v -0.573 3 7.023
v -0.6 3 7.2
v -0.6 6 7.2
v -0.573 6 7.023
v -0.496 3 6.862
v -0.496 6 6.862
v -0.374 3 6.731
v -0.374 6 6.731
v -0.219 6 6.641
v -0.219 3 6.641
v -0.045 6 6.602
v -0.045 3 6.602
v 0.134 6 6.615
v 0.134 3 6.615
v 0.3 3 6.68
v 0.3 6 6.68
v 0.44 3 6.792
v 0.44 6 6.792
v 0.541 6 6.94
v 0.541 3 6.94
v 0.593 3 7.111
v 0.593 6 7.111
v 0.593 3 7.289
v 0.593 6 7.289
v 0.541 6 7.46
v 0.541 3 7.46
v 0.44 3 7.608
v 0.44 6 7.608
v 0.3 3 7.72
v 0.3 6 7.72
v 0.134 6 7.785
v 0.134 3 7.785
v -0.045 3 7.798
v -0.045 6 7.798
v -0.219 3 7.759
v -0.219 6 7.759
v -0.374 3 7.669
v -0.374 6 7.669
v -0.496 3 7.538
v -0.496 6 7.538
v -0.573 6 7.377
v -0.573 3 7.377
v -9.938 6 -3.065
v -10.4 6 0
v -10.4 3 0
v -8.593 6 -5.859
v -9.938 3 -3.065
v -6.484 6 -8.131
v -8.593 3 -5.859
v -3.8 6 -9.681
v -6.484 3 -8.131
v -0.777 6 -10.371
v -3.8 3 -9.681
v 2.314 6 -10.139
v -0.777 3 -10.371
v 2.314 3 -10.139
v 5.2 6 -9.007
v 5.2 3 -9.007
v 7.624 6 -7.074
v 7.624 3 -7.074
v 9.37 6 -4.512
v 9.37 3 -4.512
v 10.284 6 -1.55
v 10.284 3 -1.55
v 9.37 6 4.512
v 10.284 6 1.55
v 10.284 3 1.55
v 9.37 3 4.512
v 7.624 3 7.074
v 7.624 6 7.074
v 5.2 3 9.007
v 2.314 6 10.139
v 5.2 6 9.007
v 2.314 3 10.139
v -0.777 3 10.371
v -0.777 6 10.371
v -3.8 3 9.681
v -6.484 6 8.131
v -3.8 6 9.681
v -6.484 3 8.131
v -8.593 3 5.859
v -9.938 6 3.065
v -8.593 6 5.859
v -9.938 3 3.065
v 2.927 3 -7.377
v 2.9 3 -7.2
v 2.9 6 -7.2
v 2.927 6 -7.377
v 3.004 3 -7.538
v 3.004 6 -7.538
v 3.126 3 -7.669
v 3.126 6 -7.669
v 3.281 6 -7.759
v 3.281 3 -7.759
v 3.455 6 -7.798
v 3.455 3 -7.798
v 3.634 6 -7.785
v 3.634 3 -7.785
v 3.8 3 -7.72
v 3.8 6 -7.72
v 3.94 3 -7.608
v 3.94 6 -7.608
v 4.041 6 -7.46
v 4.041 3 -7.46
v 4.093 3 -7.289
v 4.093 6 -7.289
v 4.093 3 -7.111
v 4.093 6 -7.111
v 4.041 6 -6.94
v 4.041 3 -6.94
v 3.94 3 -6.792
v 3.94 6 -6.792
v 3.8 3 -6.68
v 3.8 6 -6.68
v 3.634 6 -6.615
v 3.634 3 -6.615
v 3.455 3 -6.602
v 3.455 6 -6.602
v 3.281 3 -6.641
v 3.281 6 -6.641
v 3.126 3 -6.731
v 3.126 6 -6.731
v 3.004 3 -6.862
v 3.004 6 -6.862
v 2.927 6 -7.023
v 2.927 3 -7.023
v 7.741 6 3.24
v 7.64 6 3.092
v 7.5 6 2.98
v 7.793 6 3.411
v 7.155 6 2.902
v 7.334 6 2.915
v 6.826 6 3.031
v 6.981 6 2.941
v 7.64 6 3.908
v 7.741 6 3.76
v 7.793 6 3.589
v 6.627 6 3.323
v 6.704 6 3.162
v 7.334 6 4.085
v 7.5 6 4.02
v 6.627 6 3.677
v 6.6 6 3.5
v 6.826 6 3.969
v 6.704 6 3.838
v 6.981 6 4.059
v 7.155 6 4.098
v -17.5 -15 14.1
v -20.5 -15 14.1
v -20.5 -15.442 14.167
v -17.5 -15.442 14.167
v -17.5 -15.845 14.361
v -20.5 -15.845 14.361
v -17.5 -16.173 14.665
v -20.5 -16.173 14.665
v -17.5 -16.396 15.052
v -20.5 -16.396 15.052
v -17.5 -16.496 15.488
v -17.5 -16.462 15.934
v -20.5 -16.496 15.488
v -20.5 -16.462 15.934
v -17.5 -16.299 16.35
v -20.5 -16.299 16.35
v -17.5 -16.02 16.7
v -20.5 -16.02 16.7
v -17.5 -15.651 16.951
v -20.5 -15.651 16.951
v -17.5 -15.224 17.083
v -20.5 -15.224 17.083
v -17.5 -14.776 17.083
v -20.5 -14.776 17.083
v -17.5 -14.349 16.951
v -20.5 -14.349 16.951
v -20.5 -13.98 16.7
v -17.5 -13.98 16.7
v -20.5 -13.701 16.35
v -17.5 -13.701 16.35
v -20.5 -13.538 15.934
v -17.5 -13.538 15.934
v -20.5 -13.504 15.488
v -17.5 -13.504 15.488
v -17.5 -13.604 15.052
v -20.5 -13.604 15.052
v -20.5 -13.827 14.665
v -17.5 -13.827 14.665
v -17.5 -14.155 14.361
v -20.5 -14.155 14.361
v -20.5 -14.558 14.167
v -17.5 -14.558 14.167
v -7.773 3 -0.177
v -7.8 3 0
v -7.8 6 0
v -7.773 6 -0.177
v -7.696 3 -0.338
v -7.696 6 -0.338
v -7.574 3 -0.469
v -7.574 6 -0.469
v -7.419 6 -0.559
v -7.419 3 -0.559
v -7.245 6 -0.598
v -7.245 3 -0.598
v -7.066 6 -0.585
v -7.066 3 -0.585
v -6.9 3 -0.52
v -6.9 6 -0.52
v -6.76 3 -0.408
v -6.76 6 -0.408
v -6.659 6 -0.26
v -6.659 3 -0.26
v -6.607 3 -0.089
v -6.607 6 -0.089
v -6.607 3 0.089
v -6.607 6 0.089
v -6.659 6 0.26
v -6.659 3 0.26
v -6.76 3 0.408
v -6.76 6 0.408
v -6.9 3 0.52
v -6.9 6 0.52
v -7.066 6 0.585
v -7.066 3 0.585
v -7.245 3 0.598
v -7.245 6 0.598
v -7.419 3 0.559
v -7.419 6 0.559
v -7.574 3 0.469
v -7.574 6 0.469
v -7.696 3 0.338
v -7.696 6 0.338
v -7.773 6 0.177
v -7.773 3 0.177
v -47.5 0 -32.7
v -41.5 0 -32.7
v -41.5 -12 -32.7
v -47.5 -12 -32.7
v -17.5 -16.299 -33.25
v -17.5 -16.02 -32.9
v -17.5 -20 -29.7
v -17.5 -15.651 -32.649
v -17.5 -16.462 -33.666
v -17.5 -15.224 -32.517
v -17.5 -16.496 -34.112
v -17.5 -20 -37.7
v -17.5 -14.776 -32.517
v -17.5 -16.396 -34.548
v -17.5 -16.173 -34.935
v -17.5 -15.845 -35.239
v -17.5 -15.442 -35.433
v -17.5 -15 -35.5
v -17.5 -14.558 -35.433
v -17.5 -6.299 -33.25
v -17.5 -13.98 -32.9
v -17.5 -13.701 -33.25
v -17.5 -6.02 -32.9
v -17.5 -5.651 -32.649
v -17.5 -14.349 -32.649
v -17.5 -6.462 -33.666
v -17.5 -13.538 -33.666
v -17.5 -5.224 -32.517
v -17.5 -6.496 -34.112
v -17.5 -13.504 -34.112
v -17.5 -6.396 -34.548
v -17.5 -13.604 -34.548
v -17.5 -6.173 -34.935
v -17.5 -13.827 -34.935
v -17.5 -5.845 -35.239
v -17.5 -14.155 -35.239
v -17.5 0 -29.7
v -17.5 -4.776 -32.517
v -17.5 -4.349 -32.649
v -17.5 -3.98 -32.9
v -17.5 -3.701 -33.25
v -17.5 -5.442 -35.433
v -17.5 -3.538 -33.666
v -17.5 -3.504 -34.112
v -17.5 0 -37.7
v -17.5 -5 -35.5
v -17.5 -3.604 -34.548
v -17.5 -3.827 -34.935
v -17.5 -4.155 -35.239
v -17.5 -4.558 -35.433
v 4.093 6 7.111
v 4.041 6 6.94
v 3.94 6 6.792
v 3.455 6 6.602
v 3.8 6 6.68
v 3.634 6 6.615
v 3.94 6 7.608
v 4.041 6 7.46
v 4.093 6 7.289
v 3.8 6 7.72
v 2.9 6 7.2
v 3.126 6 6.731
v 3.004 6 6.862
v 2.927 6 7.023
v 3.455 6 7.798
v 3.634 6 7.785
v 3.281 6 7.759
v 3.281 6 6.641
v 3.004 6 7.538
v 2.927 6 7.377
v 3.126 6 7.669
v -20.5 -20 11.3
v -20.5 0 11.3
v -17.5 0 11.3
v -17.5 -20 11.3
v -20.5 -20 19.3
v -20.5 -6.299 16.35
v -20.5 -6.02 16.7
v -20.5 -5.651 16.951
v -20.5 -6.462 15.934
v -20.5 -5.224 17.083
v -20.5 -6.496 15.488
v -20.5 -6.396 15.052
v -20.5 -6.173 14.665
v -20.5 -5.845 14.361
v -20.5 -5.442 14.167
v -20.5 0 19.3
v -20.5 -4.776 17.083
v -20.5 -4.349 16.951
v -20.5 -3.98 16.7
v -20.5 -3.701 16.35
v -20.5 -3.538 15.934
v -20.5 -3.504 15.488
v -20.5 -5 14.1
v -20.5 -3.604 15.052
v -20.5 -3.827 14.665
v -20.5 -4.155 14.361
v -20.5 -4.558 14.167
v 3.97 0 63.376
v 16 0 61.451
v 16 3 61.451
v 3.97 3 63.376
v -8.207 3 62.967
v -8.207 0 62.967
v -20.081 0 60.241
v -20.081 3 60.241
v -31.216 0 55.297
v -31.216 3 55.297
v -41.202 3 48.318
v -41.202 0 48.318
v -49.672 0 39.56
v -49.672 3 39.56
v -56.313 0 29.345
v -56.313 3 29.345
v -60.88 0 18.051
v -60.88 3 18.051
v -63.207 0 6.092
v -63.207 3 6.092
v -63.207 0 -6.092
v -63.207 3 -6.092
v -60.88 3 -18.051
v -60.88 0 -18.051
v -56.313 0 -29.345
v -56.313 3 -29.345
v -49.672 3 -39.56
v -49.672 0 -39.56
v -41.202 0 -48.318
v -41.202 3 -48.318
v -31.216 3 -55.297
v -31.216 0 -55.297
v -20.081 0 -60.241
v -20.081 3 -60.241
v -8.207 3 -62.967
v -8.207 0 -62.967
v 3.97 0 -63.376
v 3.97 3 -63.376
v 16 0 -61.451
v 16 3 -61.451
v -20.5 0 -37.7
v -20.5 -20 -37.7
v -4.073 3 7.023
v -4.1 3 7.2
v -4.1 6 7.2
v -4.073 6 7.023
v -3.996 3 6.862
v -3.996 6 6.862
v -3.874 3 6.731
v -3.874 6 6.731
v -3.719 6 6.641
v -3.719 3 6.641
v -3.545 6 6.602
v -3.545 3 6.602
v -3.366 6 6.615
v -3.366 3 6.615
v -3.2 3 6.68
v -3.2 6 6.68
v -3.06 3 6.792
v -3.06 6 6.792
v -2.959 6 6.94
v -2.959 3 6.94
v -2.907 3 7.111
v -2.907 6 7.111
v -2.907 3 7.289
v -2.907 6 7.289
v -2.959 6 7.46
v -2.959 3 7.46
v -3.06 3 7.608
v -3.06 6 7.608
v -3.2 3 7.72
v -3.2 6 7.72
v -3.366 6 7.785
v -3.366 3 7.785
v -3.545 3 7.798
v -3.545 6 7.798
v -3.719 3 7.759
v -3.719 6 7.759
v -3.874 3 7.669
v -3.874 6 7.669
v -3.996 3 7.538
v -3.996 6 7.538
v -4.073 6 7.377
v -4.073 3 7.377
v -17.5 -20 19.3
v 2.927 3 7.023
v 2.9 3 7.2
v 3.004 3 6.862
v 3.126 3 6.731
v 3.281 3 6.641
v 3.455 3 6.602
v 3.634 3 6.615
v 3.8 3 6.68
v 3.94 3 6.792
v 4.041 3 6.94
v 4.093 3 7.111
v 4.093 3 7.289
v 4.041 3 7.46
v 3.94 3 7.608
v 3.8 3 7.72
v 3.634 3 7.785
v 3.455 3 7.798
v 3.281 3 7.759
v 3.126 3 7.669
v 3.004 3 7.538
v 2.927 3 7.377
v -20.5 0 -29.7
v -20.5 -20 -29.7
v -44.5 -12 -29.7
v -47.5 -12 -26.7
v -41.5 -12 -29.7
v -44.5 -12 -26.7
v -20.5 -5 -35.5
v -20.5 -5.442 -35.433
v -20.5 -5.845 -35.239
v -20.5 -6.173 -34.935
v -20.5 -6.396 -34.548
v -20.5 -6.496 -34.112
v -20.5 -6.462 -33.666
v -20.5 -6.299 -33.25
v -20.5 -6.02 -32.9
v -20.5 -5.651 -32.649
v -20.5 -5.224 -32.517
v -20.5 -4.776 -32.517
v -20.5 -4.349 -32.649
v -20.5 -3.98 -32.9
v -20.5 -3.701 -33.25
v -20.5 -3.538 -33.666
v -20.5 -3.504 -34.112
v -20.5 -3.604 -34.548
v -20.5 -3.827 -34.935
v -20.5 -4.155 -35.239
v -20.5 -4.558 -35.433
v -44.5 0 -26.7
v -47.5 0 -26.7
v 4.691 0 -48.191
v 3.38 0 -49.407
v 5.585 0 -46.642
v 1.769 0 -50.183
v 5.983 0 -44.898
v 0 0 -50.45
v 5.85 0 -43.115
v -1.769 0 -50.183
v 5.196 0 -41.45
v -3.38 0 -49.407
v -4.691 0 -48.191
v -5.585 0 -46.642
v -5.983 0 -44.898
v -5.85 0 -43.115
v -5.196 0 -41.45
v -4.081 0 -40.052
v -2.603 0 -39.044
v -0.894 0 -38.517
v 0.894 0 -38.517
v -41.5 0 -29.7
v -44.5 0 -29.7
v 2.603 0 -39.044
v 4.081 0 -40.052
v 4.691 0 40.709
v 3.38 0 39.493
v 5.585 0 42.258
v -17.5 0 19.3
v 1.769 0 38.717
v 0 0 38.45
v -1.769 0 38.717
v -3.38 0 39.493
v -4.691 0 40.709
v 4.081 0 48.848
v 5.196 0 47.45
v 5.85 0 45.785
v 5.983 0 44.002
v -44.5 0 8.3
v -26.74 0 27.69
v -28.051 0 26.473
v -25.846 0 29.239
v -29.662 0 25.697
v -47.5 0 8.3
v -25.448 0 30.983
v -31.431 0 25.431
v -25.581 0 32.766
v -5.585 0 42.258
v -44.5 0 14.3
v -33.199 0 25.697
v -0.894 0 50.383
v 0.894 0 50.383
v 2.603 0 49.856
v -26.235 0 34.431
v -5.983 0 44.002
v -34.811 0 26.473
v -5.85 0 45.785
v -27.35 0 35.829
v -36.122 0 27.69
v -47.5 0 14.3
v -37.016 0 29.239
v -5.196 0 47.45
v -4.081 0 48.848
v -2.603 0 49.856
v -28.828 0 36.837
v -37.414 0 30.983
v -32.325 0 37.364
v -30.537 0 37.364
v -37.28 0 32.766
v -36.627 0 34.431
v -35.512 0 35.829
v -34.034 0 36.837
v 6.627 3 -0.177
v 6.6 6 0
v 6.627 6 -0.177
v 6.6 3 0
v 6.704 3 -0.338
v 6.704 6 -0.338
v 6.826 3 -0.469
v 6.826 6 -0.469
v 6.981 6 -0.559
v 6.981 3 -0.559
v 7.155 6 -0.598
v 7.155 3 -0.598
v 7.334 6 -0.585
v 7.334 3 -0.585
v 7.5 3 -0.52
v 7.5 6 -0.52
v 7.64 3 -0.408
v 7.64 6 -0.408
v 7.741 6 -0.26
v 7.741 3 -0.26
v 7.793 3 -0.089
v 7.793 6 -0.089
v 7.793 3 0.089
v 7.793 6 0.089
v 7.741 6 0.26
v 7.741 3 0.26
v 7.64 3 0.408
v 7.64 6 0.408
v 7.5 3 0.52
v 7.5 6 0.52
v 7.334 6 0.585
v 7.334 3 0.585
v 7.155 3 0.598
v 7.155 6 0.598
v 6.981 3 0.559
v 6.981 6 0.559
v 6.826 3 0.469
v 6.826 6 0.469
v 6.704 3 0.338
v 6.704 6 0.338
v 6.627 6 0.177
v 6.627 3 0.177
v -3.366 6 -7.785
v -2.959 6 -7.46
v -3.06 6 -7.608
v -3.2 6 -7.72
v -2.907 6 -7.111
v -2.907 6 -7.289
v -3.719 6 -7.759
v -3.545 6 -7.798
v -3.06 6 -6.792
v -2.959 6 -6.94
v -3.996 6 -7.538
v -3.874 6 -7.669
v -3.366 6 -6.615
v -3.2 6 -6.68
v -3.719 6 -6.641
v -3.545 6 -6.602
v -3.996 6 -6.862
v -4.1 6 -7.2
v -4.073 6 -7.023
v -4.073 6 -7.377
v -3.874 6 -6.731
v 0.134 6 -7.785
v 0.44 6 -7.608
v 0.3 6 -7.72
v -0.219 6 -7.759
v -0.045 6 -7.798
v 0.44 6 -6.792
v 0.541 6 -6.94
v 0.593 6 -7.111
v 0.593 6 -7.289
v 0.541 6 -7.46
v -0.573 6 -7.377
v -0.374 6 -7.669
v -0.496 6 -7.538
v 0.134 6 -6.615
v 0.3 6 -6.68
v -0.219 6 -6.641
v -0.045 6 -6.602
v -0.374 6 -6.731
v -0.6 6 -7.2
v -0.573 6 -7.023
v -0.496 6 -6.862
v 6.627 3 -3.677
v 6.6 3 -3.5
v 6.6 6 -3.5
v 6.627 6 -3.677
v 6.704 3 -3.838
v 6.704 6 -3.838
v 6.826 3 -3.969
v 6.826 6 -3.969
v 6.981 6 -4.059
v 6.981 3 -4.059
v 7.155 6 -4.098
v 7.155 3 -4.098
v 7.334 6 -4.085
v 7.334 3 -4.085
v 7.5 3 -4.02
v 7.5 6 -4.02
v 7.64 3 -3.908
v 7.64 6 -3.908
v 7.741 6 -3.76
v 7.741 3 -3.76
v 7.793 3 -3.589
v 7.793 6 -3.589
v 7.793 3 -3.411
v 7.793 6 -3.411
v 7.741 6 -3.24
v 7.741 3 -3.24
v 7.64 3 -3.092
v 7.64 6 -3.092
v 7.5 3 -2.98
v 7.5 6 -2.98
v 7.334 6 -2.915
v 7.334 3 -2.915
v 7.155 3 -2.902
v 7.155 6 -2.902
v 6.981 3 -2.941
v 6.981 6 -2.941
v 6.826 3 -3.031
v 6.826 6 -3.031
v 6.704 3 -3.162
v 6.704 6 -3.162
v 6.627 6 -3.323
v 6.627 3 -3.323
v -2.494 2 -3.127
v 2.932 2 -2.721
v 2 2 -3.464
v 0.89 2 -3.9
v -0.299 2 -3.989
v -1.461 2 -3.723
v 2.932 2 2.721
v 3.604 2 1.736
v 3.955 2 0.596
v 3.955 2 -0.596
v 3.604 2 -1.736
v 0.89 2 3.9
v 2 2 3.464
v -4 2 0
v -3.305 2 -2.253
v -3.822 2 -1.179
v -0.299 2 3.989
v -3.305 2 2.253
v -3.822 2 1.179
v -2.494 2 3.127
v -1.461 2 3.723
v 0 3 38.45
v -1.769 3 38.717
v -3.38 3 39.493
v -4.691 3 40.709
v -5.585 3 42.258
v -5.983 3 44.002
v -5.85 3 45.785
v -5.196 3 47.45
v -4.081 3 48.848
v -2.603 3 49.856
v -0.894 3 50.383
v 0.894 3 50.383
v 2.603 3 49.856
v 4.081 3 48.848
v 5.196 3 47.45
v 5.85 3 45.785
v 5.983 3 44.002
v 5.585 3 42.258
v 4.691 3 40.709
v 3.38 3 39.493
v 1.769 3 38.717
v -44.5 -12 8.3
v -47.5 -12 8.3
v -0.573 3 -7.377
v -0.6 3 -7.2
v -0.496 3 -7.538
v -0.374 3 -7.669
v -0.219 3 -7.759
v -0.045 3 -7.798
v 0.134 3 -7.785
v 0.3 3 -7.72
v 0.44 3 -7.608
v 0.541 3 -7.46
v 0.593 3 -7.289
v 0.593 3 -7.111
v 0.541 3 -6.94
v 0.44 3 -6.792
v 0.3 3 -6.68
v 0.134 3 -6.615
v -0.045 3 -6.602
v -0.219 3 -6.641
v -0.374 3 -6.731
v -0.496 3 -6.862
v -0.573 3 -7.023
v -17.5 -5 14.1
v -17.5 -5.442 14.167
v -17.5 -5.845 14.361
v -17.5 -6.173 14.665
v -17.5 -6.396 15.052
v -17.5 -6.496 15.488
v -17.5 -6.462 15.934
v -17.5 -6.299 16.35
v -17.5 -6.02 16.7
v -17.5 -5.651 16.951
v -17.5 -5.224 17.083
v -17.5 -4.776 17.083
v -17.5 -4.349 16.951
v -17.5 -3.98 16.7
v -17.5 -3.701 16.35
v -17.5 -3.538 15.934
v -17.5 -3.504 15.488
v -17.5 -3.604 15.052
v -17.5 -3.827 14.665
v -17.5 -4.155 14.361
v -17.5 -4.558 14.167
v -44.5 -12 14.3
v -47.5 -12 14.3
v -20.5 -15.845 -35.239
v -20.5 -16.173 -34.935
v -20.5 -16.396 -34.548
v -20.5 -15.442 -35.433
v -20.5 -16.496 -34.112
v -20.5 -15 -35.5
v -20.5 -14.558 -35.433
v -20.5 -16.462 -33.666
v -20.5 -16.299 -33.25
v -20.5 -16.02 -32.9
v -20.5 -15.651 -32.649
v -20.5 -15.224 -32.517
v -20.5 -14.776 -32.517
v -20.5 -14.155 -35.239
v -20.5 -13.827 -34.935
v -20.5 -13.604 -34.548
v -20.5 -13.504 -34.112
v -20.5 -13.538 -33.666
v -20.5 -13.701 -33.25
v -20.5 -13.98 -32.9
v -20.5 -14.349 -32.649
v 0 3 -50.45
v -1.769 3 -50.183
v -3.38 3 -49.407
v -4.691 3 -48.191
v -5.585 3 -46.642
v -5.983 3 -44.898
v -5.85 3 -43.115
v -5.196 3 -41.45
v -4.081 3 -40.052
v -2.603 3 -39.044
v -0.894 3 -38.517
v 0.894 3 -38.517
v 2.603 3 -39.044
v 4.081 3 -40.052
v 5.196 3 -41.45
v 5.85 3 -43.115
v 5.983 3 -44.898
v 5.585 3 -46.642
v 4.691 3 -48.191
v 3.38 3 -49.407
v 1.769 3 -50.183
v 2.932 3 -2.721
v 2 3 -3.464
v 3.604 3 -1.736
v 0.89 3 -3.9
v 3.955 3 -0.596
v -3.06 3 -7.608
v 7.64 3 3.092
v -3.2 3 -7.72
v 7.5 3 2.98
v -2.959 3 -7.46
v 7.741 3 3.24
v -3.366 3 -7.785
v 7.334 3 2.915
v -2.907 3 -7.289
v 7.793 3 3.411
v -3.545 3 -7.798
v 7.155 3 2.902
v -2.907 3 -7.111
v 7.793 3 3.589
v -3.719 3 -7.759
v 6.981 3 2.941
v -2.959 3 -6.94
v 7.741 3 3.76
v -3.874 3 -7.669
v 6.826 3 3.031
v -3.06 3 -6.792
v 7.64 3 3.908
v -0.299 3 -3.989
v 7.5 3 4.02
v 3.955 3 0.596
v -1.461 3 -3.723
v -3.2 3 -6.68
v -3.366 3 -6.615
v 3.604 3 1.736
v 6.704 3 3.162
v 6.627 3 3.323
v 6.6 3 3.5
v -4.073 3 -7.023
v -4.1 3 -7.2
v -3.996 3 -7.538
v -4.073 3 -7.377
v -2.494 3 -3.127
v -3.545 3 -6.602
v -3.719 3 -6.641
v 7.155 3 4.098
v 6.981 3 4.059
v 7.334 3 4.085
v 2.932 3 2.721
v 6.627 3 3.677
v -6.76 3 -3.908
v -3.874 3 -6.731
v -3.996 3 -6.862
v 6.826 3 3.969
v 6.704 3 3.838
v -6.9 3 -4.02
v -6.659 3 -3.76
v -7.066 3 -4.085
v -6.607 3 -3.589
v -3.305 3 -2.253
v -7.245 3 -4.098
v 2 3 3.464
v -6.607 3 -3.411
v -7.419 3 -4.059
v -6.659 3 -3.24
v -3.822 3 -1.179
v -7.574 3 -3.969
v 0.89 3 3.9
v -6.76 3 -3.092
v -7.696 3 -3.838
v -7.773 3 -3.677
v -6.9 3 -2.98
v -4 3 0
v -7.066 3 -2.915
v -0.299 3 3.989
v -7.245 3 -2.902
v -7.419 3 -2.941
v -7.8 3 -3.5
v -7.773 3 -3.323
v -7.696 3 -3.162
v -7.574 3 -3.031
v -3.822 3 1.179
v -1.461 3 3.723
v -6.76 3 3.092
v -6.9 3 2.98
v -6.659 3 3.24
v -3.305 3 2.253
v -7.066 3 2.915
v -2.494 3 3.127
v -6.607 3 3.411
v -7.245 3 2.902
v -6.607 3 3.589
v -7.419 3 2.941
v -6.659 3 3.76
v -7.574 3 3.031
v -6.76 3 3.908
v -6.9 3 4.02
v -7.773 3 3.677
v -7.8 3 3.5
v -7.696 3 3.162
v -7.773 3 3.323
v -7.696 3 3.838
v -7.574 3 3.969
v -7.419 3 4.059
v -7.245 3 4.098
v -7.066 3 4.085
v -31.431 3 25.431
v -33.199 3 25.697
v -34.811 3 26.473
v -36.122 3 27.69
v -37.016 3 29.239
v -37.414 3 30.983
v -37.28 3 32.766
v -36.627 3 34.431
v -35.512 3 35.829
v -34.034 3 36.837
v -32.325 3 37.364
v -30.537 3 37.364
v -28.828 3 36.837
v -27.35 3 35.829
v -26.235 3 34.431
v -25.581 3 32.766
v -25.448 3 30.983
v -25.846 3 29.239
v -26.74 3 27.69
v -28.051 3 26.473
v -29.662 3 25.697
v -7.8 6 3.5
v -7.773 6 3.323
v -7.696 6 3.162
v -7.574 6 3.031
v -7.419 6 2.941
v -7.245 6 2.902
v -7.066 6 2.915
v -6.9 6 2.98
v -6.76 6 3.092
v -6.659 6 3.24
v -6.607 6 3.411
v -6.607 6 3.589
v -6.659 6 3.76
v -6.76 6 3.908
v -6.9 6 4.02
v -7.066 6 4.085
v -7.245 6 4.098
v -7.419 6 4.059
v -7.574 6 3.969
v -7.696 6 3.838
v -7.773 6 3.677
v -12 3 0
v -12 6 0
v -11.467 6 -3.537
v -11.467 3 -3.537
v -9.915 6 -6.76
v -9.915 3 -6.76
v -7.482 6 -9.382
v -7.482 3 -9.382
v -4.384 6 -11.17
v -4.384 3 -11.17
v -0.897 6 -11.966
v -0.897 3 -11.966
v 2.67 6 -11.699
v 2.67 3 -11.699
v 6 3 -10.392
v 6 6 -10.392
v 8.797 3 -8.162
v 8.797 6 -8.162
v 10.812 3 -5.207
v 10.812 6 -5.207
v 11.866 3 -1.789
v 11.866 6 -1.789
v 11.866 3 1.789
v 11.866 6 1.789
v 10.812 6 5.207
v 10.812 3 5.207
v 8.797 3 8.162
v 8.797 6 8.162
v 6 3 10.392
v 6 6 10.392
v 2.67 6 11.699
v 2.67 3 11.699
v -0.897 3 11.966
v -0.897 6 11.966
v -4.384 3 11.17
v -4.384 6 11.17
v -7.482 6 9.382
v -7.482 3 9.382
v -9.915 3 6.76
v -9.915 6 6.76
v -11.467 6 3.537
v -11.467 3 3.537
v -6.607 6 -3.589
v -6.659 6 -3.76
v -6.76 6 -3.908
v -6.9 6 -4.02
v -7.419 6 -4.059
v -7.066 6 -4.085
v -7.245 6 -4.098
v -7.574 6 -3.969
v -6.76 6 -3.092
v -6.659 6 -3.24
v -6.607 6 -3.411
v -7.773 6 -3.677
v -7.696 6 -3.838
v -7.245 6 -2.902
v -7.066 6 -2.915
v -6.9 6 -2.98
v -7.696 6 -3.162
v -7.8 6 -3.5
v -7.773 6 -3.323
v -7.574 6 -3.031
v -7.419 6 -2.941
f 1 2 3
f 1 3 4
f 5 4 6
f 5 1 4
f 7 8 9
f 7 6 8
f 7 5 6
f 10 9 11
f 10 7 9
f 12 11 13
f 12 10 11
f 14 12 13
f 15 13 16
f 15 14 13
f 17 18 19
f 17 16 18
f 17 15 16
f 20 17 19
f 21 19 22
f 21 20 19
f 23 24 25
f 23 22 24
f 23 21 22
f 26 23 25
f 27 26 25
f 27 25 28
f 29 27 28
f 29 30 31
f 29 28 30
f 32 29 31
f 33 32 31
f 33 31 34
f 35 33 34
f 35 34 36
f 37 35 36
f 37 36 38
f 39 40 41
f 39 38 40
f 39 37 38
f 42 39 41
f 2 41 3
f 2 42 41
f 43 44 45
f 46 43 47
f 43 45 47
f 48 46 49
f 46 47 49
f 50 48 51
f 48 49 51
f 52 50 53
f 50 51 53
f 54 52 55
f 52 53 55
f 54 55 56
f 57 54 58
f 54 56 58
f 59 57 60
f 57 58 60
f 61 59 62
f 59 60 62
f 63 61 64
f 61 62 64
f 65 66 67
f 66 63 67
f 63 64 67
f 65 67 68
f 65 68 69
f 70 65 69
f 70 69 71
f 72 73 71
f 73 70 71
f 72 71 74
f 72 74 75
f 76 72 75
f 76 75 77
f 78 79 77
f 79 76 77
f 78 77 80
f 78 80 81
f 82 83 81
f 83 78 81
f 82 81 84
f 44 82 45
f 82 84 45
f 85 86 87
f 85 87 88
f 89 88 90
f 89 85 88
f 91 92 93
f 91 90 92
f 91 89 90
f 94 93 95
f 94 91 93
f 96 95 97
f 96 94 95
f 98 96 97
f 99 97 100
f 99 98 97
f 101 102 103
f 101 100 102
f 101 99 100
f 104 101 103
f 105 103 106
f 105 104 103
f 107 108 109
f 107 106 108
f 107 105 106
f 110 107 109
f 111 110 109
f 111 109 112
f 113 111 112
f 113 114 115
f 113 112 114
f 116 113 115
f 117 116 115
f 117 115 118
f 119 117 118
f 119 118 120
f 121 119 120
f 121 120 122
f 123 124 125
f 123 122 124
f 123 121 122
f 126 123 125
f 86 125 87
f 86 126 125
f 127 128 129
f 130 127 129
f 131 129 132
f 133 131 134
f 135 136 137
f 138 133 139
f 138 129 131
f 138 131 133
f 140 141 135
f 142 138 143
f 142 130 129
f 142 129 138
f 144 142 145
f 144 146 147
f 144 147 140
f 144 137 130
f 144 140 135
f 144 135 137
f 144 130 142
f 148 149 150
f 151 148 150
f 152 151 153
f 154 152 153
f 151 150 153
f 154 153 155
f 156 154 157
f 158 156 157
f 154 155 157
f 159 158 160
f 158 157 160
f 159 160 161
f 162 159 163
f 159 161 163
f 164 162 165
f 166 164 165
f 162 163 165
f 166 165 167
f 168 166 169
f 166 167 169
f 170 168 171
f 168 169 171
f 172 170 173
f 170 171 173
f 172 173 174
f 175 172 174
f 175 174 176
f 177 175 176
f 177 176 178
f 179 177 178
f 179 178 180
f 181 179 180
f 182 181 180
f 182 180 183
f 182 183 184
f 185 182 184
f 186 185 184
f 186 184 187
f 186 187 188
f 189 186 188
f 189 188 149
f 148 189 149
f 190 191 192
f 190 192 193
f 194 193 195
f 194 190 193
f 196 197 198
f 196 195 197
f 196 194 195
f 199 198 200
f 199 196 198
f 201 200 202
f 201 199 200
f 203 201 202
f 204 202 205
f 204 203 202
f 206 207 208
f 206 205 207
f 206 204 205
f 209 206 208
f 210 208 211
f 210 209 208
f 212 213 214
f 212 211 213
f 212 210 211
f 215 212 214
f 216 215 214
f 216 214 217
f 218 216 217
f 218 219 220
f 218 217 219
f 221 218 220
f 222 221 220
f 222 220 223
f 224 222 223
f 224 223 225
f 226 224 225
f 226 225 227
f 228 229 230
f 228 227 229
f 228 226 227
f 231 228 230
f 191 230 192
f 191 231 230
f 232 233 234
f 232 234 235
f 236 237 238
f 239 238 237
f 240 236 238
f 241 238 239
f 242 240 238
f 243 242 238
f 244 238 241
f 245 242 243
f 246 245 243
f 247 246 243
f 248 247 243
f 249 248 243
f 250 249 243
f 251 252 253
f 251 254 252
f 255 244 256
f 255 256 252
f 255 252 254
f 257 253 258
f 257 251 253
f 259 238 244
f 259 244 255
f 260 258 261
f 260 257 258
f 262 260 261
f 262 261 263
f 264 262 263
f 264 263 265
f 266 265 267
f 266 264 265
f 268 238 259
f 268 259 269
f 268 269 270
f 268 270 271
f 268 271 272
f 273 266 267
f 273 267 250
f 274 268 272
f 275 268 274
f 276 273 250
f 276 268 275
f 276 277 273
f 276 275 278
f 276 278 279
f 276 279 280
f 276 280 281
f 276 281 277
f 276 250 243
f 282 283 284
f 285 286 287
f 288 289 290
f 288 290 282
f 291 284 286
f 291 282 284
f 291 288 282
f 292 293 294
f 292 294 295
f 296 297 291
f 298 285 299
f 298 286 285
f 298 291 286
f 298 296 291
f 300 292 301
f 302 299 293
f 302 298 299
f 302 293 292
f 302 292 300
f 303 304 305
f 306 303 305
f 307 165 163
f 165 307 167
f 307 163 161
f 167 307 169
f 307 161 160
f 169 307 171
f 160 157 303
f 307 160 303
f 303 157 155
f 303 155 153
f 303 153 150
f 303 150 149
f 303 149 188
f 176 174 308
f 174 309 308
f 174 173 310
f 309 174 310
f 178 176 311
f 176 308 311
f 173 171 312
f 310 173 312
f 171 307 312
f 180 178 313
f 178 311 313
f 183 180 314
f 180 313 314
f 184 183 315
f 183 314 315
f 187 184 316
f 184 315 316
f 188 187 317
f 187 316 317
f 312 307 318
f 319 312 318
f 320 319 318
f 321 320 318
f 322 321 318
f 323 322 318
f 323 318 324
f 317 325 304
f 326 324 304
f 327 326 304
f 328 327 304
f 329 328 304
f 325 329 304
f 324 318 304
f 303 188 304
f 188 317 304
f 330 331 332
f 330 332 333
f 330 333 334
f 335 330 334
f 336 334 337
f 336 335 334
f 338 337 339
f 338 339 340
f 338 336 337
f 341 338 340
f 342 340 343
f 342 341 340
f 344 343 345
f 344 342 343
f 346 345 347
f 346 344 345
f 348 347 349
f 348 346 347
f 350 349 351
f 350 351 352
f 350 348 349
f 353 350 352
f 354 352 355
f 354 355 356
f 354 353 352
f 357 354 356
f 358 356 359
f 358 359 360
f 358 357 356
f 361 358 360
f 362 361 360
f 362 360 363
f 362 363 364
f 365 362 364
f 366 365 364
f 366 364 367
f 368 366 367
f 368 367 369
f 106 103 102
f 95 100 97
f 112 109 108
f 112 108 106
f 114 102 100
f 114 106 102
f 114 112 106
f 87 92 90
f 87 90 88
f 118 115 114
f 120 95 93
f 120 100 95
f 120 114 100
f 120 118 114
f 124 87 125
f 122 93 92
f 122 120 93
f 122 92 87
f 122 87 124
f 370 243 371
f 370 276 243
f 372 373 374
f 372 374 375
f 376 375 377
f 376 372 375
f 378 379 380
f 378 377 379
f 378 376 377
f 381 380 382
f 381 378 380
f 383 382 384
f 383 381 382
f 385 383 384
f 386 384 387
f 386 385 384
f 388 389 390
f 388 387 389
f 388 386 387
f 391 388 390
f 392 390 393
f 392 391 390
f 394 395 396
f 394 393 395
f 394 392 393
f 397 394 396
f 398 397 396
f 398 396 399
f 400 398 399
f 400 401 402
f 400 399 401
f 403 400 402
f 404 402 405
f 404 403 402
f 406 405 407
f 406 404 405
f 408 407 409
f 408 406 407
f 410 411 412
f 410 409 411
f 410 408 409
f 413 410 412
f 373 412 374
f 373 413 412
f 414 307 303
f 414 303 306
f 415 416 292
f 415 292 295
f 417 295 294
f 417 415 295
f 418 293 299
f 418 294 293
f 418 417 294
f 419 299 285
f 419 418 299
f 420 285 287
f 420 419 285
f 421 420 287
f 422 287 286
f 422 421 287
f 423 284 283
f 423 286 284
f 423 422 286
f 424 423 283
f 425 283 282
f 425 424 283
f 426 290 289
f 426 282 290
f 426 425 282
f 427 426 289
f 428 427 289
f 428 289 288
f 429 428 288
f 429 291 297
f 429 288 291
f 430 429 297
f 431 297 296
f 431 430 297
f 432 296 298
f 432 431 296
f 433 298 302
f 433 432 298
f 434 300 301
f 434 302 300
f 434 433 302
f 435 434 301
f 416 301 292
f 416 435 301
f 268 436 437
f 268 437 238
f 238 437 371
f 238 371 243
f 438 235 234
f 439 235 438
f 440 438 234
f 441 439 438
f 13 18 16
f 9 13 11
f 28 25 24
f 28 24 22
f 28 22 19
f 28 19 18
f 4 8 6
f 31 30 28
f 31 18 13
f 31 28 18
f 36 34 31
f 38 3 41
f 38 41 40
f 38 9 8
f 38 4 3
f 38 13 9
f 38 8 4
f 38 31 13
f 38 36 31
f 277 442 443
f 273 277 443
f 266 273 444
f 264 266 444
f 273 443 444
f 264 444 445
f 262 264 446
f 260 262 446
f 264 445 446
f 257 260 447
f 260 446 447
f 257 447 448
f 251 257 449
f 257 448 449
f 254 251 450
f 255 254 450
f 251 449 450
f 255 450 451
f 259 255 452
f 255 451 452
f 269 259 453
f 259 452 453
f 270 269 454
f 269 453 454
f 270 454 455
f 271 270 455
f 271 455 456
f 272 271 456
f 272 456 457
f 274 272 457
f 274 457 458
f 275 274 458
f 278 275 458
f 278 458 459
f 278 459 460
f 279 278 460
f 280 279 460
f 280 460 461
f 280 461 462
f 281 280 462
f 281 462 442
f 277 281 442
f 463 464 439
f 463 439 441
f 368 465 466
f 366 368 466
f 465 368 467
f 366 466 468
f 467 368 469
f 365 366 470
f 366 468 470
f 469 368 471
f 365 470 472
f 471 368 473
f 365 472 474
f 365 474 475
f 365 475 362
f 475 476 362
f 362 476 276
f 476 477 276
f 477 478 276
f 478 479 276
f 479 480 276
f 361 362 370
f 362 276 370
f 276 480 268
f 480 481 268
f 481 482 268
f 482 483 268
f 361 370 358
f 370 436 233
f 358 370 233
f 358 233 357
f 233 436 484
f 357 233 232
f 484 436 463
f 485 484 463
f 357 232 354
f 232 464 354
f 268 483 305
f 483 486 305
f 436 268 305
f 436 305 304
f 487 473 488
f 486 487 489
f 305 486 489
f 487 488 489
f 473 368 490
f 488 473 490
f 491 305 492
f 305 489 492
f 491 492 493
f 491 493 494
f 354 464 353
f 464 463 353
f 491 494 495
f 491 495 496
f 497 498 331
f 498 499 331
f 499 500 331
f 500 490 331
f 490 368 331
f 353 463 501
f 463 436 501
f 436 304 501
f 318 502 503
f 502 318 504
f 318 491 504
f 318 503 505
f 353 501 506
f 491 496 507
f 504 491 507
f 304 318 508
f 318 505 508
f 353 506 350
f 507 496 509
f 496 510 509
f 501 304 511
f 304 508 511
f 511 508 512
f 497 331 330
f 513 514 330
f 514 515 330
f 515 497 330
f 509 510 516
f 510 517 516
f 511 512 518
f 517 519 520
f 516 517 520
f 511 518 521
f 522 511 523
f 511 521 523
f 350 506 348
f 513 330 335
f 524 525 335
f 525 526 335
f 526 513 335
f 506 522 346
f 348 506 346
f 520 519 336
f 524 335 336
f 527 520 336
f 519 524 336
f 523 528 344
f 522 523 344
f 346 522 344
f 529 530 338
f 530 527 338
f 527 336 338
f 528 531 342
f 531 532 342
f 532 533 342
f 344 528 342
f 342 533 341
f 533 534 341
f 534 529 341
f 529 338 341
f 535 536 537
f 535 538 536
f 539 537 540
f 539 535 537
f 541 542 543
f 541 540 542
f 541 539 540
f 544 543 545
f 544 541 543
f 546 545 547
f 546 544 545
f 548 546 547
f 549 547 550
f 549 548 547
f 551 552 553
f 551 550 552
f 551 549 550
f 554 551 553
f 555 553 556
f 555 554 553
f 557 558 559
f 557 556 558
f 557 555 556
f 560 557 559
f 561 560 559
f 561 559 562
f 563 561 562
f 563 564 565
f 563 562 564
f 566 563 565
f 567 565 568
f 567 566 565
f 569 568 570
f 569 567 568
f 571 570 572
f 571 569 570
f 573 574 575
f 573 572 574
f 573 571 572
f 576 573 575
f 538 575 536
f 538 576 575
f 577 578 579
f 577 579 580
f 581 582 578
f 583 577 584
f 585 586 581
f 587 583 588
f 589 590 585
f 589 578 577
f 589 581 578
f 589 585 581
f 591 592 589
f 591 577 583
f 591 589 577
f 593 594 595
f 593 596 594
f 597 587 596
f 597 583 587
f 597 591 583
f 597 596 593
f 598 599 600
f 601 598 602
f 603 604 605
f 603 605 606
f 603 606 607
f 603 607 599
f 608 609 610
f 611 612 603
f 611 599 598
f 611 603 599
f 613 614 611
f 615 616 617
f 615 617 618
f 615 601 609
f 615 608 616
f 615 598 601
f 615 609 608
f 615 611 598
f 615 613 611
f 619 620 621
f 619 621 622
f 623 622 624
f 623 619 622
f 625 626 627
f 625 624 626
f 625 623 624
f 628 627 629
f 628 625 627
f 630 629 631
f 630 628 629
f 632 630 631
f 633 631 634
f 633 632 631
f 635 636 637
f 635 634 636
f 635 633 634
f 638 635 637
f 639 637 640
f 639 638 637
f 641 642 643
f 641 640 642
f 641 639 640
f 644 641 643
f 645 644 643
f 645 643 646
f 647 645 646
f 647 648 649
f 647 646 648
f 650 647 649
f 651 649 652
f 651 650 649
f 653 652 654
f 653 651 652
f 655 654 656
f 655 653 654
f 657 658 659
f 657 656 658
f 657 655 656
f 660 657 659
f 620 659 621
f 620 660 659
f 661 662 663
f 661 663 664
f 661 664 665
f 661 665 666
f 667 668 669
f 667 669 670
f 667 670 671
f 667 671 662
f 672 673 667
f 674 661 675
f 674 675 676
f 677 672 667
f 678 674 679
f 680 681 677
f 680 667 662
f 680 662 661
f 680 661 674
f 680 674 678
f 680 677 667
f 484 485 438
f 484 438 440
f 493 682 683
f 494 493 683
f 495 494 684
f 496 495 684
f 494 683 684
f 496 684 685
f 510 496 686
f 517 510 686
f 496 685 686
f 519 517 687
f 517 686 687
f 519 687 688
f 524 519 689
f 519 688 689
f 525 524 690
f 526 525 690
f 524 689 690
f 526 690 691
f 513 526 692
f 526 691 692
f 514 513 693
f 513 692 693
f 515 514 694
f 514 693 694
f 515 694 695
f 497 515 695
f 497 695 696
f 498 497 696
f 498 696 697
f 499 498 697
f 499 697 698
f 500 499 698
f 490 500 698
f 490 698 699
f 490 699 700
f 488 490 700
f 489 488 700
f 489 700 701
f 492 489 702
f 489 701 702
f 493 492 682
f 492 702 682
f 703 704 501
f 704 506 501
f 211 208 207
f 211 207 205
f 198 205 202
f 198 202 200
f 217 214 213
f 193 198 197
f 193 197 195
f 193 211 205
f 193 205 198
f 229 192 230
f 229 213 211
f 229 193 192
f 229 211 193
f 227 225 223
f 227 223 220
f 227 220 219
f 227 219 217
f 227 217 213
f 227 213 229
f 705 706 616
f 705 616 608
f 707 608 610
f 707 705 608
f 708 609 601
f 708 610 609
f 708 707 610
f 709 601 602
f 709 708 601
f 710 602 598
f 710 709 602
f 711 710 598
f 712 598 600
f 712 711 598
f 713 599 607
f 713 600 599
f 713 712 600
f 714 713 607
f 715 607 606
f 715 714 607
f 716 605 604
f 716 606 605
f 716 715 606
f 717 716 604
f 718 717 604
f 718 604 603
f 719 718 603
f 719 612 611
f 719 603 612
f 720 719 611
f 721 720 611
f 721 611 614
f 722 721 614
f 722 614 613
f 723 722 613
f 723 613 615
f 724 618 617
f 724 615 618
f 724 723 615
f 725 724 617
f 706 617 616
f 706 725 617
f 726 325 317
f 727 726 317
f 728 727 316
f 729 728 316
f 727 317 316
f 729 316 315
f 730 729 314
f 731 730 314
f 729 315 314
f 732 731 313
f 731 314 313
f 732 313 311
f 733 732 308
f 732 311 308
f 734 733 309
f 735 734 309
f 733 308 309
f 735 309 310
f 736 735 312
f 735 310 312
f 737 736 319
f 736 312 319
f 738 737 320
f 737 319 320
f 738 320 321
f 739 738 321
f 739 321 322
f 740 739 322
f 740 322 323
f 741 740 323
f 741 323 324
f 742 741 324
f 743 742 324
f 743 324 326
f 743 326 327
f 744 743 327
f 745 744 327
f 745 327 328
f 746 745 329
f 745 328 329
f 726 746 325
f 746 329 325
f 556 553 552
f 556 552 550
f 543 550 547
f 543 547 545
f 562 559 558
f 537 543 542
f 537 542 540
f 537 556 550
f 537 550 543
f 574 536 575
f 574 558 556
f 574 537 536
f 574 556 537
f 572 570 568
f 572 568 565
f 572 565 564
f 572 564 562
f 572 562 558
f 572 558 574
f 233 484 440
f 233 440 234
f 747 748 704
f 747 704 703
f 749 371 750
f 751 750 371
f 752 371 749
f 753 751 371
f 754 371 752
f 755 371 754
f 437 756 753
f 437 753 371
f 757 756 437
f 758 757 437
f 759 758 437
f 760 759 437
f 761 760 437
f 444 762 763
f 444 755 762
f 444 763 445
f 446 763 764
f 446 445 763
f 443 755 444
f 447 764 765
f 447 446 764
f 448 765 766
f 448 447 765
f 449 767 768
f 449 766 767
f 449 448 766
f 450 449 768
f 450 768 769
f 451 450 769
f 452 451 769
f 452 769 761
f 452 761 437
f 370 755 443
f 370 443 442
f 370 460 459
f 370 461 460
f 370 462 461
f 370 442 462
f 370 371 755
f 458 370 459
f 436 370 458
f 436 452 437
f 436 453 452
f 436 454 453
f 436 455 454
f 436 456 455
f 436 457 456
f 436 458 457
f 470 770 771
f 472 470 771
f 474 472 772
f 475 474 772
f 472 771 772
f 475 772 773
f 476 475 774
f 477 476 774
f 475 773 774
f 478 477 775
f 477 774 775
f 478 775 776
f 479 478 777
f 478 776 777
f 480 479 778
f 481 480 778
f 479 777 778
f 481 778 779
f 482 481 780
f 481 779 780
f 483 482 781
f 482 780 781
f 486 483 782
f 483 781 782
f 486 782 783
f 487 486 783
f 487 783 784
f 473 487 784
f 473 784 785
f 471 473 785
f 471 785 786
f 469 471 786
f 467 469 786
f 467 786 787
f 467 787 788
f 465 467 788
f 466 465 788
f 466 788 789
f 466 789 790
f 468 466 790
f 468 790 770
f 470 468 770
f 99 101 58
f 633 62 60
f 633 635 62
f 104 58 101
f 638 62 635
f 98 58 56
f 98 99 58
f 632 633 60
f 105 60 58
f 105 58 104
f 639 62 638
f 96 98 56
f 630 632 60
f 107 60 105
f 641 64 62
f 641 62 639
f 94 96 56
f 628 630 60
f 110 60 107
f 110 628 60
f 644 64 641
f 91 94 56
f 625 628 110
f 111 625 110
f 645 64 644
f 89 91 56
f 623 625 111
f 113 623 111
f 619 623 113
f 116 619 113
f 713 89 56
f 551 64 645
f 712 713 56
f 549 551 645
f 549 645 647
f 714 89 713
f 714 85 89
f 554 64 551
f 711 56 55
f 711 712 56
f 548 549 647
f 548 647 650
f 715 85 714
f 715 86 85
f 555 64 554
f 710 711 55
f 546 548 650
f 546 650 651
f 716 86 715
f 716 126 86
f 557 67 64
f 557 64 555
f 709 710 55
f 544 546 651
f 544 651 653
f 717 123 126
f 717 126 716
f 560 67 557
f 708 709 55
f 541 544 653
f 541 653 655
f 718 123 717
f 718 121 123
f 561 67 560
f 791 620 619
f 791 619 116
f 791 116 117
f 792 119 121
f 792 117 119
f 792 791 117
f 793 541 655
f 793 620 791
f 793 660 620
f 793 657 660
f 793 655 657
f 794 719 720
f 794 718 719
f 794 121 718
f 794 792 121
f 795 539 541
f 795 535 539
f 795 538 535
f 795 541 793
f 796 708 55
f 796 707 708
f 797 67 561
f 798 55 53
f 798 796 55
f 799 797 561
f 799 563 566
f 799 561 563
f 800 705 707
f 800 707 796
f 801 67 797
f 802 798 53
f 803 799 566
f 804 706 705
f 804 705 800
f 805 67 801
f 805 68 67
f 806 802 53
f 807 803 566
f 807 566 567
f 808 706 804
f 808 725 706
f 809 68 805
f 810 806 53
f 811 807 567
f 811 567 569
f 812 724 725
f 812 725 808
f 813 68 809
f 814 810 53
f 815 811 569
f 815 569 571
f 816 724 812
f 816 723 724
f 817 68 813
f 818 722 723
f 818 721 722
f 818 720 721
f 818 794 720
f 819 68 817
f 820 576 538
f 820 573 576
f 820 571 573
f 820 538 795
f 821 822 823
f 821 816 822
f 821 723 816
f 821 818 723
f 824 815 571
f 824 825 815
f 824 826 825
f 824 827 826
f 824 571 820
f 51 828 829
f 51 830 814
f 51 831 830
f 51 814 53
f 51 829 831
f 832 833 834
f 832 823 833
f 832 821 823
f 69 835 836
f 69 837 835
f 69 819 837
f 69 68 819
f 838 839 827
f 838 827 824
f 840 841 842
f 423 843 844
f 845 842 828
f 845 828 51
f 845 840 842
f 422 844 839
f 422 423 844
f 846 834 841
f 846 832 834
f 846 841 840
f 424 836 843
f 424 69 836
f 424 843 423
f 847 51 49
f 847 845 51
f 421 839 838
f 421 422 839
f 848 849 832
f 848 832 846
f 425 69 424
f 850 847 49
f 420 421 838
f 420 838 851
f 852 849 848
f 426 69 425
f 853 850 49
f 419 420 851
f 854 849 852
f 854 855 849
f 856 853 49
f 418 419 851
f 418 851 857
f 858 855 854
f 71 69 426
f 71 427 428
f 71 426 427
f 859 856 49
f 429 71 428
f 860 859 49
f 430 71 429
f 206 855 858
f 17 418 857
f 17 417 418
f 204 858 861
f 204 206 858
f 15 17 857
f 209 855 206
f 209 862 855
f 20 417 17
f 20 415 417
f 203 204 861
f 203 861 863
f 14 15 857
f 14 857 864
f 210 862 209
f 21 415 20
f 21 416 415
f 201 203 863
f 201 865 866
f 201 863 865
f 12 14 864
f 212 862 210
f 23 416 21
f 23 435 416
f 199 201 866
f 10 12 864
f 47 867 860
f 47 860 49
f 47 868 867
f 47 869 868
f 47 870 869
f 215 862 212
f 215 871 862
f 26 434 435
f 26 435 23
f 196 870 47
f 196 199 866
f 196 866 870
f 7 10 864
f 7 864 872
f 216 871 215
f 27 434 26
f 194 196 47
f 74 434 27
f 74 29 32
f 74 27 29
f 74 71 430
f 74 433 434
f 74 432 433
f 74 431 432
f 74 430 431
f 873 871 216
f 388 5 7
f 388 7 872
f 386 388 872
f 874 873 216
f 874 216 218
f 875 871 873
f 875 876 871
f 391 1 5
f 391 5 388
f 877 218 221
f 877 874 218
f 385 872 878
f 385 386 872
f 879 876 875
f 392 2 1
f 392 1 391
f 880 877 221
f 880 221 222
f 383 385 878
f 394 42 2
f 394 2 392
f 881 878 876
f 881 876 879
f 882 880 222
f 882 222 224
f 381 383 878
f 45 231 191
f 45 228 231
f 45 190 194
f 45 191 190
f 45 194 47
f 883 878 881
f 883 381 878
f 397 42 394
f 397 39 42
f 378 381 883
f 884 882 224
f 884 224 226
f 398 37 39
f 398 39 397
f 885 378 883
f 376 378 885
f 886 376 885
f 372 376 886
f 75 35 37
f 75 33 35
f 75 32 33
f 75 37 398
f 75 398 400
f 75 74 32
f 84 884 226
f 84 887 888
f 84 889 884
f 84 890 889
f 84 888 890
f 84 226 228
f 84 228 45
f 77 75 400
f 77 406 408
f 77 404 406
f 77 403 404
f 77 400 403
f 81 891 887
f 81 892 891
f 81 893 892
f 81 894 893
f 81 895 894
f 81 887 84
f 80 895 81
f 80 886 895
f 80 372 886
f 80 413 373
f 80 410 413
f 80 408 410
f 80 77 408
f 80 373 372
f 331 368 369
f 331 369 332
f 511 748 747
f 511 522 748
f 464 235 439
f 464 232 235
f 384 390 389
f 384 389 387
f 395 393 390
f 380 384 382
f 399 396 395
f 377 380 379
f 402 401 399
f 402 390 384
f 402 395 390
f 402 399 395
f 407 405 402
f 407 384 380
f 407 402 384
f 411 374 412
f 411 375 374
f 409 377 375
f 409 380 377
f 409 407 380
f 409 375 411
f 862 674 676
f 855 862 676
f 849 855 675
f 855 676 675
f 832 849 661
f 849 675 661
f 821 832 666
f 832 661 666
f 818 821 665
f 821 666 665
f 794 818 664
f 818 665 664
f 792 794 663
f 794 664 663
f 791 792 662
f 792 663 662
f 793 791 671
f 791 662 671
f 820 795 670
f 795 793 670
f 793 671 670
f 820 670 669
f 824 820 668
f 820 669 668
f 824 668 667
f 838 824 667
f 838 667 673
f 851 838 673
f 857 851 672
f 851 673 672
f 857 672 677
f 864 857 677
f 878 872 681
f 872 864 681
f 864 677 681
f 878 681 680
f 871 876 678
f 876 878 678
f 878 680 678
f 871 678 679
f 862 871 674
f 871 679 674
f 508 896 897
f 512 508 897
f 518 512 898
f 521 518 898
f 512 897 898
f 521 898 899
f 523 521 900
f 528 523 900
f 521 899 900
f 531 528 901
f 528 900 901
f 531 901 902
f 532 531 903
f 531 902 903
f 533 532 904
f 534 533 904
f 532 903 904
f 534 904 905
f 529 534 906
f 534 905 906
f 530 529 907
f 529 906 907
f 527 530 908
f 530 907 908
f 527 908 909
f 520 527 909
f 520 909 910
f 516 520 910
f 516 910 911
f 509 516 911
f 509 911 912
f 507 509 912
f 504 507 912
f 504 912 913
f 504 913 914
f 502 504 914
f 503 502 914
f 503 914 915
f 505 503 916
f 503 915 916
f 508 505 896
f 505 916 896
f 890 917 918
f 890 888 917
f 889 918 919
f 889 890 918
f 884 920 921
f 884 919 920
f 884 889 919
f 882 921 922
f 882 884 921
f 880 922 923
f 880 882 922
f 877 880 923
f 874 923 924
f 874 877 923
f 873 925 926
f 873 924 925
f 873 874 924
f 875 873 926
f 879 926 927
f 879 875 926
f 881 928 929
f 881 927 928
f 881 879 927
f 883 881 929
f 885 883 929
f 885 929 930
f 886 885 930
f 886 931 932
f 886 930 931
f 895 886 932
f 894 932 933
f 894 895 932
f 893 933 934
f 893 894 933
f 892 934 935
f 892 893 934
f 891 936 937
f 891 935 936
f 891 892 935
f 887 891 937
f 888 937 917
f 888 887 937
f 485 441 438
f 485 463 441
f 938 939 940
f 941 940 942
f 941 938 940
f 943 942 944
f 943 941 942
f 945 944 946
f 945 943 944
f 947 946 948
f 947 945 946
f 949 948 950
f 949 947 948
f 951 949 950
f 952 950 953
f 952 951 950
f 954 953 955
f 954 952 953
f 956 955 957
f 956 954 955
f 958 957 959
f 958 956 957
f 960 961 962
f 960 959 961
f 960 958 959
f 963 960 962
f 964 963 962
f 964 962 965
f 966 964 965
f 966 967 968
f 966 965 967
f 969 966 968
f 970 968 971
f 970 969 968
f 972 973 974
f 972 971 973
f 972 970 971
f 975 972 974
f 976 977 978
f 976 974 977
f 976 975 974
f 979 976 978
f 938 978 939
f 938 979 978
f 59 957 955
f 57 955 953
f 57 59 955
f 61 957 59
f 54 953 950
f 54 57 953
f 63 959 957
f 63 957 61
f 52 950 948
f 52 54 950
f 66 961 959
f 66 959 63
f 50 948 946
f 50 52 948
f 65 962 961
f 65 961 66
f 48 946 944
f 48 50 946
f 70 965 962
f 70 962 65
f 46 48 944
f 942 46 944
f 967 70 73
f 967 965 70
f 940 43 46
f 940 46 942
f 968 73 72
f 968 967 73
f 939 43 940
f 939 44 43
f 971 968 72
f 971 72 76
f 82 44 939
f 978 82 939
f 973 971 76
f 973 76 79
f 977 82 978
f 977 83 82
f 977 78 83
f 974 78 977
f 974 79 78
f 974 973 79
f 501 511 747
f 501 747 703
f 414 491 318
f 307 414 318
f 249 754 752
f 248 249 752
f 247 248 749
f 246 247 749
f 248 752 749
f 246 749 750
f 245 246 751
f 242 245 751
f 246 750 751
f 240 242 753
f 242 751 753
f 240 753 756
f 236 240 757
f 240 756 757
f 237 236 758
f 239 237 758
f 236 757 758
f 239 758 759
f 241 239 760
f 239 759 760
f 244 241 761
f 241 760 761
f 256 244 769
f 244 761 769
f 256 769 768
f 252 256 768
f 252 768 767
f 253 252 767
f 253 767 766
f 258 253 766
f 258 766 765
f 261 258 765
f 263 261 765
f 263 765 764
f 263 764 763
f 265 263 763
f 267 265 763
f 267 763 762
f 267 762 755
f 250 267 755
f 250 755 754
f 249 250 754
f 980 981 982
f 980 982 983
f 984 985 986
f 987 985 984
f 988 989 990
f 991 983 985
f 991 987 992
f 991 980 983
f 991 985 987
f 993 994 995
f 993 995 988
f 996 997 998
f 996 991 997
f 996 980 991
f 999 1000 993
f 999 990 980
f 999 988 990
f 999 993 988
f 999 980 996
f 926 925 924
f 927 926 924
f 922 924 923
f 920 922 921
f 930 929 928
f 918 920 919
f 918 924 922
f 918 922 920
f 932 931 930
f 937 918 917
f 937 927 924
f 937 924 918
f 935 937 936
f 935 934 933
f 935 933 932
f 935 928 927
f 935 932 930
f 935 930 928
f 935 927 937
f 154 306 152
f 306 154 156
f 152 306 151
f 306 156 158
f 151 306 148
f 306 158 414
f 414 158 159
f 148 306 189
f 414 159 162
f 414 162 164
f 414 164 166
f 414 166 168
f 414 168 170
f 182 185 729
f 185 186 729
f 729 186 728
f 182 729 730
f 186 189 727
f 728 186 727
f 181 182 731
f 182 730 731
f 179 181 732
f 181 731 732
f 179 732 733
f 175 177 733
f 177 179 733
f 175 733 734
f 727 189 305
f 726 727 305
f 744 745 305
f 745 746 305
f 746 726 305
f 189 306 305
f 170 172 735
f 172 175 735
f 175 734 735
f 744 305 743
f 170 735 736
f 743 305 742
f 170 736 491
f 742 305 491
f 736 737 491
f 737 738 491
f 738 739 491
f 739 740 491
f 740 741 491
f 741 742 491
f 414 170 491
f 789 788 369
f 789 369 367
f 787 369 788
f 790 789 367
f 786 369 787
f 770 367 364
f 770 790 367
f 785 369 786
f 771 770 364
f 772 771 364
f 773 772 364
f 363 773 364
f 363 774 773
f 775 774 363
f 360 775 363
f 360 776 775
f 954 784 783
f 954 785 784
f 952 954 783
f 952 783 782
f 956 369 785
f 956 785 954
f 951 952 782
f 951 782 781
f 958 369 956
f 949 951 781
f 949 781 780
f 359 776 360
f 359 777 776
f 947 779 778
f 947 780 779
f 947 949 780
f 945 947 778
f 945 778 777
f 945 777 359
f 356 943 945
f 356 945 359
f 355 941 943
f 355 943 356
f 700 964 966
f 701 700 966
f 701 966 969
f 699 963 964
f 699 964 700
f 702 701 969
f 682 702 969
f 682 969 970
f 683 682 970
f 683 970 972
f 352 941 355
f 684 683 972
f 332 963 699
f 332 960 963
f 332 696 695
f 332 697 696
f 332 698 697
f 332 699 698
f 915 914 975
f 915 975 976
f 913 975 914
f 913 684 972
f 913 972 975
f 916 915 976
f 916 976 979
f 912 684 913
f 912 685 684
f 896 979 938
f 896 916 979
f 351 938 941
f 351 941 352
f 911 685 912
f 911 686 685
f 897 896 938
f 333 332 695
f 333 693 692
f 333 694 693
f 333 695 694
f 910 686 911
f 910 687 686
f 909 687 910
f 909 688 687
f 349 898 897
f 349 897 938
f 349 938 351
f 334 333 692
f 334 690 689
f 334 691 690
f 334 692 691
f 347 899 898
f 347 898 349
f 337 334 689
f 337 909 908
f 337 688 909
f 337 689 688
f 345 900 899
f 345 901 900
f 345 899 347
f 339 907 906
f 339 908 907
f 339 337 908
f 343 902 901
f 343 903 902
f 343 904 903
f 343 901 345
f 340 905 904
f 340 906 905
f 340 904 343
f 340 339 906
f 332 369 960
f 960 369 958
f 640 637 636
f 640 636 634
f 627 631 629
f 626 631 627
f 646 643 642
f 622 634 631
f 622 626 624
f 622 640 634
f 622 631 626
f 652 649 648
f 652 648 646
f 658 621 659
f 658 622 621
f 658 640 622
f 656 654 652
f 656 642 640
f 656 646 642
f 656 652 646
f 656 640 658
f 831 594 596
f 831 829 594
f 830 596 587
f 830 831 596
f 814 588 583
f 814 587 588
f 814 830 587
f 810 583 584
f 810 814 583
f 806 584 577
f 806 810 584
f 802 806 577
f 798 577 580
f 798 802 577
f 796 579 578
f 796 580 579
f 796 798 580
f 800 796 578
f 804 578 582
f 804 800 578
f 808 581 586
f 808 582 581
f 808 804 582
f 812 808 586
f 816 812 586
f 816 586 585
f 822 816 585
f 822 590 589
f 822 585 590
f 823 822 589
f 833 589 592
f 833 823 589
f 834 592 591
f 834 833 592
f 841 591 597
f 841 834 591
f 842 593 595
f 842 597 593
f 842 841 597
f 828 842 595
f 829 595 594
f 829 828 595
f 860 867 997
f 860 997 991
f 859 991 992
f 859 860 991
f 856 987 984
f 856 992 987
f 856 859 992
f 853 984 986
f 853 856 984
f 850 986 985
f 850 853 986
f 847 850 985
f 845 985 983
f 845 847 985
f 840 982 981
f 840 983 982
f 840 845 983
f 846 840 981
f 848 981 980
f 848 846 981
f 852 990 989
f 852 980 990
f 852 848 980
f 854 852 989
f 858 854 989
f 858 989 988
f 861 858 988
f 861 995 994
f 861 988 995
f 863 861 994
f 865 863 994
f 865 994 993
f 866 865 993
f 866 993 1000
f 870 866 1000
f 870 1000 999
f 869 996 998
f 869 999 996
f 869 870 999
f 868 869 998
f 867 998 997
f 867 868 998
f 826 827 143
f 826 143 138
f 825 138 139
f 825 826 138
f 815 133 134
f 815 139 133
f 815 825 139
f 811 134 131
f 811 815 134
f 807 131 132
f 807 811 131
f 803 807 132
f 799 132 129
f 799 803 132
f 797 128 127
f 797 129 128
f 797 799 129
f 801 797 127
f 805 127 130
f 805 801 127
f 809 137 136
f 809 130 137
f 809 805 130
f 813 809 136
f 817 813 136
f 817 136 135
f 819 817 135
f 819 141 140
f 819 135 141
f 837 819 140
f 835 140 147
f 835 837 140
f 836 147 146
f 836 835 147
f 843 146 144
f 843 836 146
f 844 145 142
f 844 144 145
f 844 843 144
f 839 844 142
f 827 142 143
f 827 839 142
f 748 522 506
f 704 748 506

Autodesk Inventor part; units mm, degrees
ref_plane "XZ Plane" through (0, 0, 0) normal (0, 1, 0) x (-1, 0, 0)
sketch "Sketch1" plane through (0, 0, 0) normal (0, 1, 0) x (-1, 0, 0)
  circle A0 centre (0, 0) radius 63.5
  circle A1 centre (0, -7.2) radius 0.6
  circle A2 centre (3.5, -7.2) radius 0.6
  circle A3 centre (-3.5, -7.2) radius 0.6
  circle A4 centre (7.2, 3.5) radius 0.6
  circle A5 centre (7.2, 0) radius 0.6
  circle A6 centre (7.2, -3.5) radius 0.6
  circle A7 centre (-3.5, 7.2) radius 0.6
  circle A8 centre (0, 7.2) radius 0.6
  circle A9 centre (3.5, 7.2) radius 0.6
  circle A10 centre (-7.2, -3.5) radius 0.6
  circle A11 centre (-7.2, 0) radius 0.6
  circle A12 centre (-7.2, 3.5) radius 0.6
  circle A13 centre (0, 0) radius 10.4
  circle A14 centre (0, 0) radius 12
  circle A15 centre (0, 0) radius 4
  dimension "d0" = 127
  dimension "d1" = 7.2
  dimension "d2" = 1.2
  dimension "d3" = 3.5
  dimension "d4" = 3.5
  dimension "d5" = 1.2
  dimension "d6" = 1.2
  dimension "d9" = 360
  dimension "d15" = 20.8
  dimension "d16" = 24
  dimension "d19" = 8
extrude "Extrusion1" add sketch "Sketch1" along normal blind 3 contours A0 | A13 | A14
extrude "Extrusion2" add sketch "Sketch1" along normal blind 6 contours A1 | A2 | A3 | A4 | A5 | A6 | A7 | A8 | A9 | A10 | A11 | A12
extrude "Extrusion3" add sketch "Sketch1" along normal blind 6 contours A14
extrude "Extrusion4" add sketch "Sketch1" along normal blind 2 contours A15
sketch "Sketch2" plane through (0, 0, 0) normal (0, -1, 0) x (1, 0, 0)
  line L0 (-17.5, 11.3) -> (-44.5, 11.3) construction
  line L1 (-44.5, 11.3) -> (-44.5, -29.7) construction
  line L2 (-44.5, -29.7) -> (-17.5, -29.7) construction
  line L3 (-17.5, -29.7) -> (-17.5, 11.3) construction
  line L4 (-47.5, 14.3) -> (-47.5, 8.3)
  line L5 (-47.5, 8.3) -> (-44.5, 8.3)
  line L6 (-44.5, 8.3) -> (-44.5, 11.3)
  line L7 (-17.5, 11.3) -> (-17.5, 19.3)
  line L8 (-17.5, 19.3) -> (-20.5, 19.3)
  line L9 (-20.5, 19.3) -> (-20.5, 11.3)
  line L10 (-20.5, 11.3) -> (-17.5, 11.3)
  line L11 (-44.5, -9.2) -> (-17.5, -9.2) construction
  line L12 (-17.5, -29.7) -> (-44.5, -29.7) construction
  line L13 (-44.5, -29.7) -> (-41.5, -29.7)
  line L14 (-41.5, -29.7) -> (-41.5, -32.7)
  line L15 (-41.5, -32.7) -> (-47.5, -32.7)
  line L16 (-47.5, -32.7) -> (-47.5, -26.7)
  line L17 (-47.5, -26.7) -> (-44.5, -26.7)
  line L18 (-44.5, -26.7) -> (-44.5, -29.7)
  line L19 (-17.5, -29.7) -> (-17.5, -37.7)
  line L20 (-17.5, -37.7) -> (-20.5, -37.7)
  line L21 (-20.5, -37.7) -> (-20.5, -29.7)
  line L22 (-20.5, -29.7) -> (-17.5, -29.7)
  line L23 (-47.5, 14.3) -> (-44.5, 14.3)
  line L24 (-44.5, 14.3) -> (-44.5, 11.3)
  point P0 (0, 0)
  point P1 (-41.5, 11.3)
  point P2 (-31, 0)
  dimension "d22" = 27
  dimension "d23" = 41
  dimension "d24" = 3
  dimension "d28" = 6
  dimension "d29" = 3
  dimension "d31" = 8
  dimension "d32" = 3
  dimension "d33" = 8
  dimension "d34" = 90
  dimension "d50" = 44.5
  dimension "d51" = 29.7
  dimension "d52" = 3
  dimension "d53" = 3
extrude "Extrusion5" add sketch "Sketch2" along normal blind 12 contours L23 L24 L6 L5 L4 | L13 L14 L15 L16 L17 L18
extrude "Extrusion6" add sketch "Sketch2" along normal blind 20 contours L10 L9 L8 L7 | L19 L20 L21 L22
ref_plane "Work Plane1" through (-17.5, 0, -9.2) normal (1, 0, 0) x (0, 0, -1)
sketch "Sketch3" plane through (-17.5, 0, -9.2) normal (1, 0, 0) x (0, 0, -1)
  line L0 (0, 0) -> (0, -20) construction
  line L1 (0, 0) -> (20, 0) construction
  line L2 (28.5, -20) -> (20.5, -20) projected
  line L3 (24.8, -20) -> (24.8, 0) construction
  line L4 (24.8, -10) -> (0, -10) construction
  point P0 (-9.2, 0)
  point P1 (0, 0)
  point P2 (24.8, -15)
  point P3 (24.8, -5)
  point P4 (-24.8, -15)
  point P5 (-24.8, -5)
  dimension "d39" = 20
  dimension "d40" = 90
  dimension "d41" = 24.8
  dimension "d42" = 10
hole "Hole1" at (-17.5, -15, 15.6) at (-17.5, -5, 15.6) at (-17.5, -5, -34) at (-17.5, -15, -34) direction (-1, 0, 0) diameter 3 depth 3
sketch "Sketch4" plane through (0, 0, 0) normal (0, -1, 0) x (1, 0, 0)
  point P0 (0, 0)
  point P1 (44.45, 0)
  point P2 (31.4309, 31.4309)
  point P3 (0, 44.45)
  point P4 (-31.4309, 31.4309)
  point P5 (-44.45, 0)
  point P6 (-31.4309, -31.4309)
  point P7 (0, -44.45)
  point P8 (31.4309, -31.4309)
  dimension "d56" = 360
hole "Hole2" at (-31.4309, 0, 31.4309) at (0, 0, 44.45) at (31.4309, 0, 31.4309) at (44.45, 0, 0) at (31.4309, 0, -31.4309) at (0, 0, -44.45) direction (0, 1, 0) diameter 12 end through all
ref_plane "Work Plane2" through (16, 0, 0) normal (1, 0, 0) x (0, 1, 0)
split "Split1" plane through (16, 0, 0) removes the side toward (1, 0, 0)
properties part number "pan_platform"
